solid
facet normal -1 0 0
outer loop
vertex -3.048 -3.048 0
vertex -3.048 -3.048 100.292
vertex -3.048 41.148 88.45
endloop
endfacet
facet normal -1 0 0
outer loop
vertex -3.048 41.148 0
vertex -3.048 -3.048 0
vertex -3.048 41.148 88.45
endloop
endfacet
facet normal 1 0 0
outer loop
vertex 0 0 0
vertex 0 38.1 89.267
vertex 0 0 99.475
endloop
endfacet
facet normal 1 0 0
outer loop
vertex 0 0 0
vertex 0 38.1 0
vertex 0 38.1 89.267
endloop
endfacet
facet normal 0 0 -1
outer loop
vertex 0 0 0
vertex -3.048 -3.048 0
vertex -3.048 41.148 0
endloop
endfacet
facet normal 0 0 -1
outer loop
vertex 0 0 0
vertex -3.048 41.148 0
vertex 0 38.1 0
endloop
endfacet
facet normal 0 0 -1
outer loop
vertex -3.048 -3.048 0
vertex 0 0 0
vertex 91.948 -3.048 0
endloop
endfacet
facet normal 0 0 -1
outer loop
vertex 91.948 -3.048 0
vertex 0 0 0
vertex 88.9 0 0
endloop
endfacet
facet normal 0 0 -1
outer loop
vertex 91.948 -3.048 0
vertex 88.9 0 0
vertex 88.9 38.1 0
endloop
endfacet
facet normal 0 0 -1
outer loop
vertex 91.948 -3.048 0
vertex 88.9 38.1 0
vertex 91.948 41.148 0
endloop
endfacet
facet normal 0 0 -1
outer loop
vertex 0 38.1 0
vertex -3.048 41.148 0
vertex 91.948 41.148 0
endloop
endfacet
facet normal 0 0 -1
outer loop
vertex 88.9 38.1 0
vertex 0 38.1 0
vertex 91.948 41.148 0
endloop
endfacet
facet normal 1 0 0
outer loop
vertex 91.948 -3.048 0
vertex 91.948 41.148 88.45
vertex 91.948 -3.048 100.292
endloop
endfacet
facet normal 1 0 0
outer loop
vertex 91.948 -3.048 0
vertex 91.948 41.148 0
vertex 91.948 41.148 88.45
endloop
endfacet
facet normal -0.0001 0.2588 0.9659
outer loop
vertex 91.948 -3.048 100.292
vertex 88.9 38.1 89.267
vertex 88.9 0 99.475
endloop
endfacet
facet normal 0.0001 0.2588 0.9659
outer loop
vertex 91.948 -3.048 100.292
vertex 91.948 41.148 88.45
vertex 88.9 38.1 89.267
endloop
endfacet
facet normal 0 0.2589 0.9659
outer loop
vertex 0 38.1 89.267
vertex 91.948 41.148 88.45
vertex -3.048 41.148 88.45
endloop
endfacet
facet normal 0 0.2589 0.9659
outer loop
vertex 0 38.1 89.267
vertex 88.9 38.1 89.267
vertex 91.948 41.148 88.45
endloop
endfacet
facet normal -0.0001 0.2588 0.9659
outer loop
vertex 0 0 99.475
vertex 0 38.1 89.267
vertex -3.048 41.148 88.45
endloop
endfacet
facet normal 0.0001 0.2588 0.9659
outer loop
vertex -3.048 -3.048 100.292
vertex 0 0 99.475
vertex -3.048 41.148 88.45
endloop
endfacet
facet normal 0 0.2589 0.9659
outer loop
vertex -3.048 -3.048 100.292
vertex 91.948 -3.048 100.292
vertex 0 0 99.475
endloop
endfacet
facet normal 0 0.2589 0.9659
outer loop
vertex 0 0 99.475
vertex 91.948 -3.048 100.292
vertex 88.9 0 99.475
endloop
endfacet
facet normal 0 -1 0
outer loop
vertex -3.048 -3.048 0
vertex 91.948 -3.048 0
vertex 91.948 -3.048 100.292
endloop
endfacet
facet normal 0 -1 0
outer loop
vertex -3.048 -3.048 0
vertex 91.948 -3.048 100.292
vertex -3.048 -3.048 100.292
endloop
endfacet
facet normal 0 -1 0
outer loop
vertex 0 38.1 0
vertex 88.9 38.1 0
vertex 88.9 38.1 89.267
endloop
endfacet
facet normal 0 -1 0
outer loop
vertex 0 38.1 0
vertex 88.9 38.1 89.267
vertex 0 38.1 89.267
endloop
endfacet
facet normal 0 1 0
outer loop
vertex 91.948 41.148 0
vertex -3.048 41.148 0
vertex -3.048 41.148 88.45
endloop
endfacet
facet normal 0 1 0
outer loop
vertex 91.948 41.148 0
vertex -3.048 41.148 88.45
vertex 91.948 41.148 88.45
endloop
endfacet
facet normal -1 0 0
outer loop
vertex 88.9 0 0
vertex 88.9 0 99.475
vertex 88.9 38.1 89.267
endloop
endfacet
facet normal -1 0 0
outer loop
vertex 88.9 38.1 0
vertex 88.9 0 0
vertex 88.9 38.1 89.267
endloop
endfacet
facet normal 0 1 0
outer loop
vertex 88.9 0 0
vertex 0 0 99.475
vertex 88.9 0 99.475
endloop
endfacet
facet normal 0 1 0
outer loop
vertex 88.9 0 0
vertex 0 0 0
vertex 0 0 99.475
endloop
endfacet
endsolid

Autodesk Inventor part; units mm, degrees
ref_plane "YZ Plane" through (0, 0, 0) normal (1, 0, 0) x (0, 1, 0)
ref_plane "XZ Plane" through (0, 0, 0) normal (0, 1, 0) x (-1, 0, 0)
sketch "Sketch1" plane through (0, 0, 0) normal (0, 0, 1) x (1, 0, 0)
  line L0 (0, 0) -> (88.9, 0)
  line L1 (88.9, 0) -> (88.9, 38.1)
  line L2 (88.9, 38.1) -> (0, 38.1)
  line L3 (0, 38.1) -> (0, 0)
  line L4 (-3.048, 41.148) -> (91.948, 41.148)
  line L5 (91.948, 41.148) -> (91.948, -3.048)
  line L6 (91.948, -3.048) -> (-3.048, -3.048)
  line L7 (-3.048, -3.048) -> (-3.048, 41.148)
  dimension "d0" = 88.9
  dimension "d1" = 38.1
  dimension "d2" = 3.048
extrude "Extrusion1" add sketch "Sketch1" along normal blind 101.6
ref_plane "Work Plane2" through (-3.048, 41.148, 101.6) normal (0, 0.2588, 0.9659) x (-1, 0, 0)
sketch "Sketch3" plane through (-3.048, 41.148, 101.6) normal (0, 0.2588, 0.9659) x (-1, 0, 0)
  line L0 (-130.175, -76.2) -> (53.975, -76.2)
  line L1 (53.975, -76.2) -> (53.975, 57.15)
  line L2 (53.975, 57.15) -> (-130.175, 57.15)
  line L3 (-130.175, 57.15) -> (-130.175, -76.2)
  point P0 (-3.048, 13.4499)
extrude "Extrusion3" cut sketch "Sketch3" against normal blind 12.7
properties part number "endHoriz" material "Steel, Galvanized"
